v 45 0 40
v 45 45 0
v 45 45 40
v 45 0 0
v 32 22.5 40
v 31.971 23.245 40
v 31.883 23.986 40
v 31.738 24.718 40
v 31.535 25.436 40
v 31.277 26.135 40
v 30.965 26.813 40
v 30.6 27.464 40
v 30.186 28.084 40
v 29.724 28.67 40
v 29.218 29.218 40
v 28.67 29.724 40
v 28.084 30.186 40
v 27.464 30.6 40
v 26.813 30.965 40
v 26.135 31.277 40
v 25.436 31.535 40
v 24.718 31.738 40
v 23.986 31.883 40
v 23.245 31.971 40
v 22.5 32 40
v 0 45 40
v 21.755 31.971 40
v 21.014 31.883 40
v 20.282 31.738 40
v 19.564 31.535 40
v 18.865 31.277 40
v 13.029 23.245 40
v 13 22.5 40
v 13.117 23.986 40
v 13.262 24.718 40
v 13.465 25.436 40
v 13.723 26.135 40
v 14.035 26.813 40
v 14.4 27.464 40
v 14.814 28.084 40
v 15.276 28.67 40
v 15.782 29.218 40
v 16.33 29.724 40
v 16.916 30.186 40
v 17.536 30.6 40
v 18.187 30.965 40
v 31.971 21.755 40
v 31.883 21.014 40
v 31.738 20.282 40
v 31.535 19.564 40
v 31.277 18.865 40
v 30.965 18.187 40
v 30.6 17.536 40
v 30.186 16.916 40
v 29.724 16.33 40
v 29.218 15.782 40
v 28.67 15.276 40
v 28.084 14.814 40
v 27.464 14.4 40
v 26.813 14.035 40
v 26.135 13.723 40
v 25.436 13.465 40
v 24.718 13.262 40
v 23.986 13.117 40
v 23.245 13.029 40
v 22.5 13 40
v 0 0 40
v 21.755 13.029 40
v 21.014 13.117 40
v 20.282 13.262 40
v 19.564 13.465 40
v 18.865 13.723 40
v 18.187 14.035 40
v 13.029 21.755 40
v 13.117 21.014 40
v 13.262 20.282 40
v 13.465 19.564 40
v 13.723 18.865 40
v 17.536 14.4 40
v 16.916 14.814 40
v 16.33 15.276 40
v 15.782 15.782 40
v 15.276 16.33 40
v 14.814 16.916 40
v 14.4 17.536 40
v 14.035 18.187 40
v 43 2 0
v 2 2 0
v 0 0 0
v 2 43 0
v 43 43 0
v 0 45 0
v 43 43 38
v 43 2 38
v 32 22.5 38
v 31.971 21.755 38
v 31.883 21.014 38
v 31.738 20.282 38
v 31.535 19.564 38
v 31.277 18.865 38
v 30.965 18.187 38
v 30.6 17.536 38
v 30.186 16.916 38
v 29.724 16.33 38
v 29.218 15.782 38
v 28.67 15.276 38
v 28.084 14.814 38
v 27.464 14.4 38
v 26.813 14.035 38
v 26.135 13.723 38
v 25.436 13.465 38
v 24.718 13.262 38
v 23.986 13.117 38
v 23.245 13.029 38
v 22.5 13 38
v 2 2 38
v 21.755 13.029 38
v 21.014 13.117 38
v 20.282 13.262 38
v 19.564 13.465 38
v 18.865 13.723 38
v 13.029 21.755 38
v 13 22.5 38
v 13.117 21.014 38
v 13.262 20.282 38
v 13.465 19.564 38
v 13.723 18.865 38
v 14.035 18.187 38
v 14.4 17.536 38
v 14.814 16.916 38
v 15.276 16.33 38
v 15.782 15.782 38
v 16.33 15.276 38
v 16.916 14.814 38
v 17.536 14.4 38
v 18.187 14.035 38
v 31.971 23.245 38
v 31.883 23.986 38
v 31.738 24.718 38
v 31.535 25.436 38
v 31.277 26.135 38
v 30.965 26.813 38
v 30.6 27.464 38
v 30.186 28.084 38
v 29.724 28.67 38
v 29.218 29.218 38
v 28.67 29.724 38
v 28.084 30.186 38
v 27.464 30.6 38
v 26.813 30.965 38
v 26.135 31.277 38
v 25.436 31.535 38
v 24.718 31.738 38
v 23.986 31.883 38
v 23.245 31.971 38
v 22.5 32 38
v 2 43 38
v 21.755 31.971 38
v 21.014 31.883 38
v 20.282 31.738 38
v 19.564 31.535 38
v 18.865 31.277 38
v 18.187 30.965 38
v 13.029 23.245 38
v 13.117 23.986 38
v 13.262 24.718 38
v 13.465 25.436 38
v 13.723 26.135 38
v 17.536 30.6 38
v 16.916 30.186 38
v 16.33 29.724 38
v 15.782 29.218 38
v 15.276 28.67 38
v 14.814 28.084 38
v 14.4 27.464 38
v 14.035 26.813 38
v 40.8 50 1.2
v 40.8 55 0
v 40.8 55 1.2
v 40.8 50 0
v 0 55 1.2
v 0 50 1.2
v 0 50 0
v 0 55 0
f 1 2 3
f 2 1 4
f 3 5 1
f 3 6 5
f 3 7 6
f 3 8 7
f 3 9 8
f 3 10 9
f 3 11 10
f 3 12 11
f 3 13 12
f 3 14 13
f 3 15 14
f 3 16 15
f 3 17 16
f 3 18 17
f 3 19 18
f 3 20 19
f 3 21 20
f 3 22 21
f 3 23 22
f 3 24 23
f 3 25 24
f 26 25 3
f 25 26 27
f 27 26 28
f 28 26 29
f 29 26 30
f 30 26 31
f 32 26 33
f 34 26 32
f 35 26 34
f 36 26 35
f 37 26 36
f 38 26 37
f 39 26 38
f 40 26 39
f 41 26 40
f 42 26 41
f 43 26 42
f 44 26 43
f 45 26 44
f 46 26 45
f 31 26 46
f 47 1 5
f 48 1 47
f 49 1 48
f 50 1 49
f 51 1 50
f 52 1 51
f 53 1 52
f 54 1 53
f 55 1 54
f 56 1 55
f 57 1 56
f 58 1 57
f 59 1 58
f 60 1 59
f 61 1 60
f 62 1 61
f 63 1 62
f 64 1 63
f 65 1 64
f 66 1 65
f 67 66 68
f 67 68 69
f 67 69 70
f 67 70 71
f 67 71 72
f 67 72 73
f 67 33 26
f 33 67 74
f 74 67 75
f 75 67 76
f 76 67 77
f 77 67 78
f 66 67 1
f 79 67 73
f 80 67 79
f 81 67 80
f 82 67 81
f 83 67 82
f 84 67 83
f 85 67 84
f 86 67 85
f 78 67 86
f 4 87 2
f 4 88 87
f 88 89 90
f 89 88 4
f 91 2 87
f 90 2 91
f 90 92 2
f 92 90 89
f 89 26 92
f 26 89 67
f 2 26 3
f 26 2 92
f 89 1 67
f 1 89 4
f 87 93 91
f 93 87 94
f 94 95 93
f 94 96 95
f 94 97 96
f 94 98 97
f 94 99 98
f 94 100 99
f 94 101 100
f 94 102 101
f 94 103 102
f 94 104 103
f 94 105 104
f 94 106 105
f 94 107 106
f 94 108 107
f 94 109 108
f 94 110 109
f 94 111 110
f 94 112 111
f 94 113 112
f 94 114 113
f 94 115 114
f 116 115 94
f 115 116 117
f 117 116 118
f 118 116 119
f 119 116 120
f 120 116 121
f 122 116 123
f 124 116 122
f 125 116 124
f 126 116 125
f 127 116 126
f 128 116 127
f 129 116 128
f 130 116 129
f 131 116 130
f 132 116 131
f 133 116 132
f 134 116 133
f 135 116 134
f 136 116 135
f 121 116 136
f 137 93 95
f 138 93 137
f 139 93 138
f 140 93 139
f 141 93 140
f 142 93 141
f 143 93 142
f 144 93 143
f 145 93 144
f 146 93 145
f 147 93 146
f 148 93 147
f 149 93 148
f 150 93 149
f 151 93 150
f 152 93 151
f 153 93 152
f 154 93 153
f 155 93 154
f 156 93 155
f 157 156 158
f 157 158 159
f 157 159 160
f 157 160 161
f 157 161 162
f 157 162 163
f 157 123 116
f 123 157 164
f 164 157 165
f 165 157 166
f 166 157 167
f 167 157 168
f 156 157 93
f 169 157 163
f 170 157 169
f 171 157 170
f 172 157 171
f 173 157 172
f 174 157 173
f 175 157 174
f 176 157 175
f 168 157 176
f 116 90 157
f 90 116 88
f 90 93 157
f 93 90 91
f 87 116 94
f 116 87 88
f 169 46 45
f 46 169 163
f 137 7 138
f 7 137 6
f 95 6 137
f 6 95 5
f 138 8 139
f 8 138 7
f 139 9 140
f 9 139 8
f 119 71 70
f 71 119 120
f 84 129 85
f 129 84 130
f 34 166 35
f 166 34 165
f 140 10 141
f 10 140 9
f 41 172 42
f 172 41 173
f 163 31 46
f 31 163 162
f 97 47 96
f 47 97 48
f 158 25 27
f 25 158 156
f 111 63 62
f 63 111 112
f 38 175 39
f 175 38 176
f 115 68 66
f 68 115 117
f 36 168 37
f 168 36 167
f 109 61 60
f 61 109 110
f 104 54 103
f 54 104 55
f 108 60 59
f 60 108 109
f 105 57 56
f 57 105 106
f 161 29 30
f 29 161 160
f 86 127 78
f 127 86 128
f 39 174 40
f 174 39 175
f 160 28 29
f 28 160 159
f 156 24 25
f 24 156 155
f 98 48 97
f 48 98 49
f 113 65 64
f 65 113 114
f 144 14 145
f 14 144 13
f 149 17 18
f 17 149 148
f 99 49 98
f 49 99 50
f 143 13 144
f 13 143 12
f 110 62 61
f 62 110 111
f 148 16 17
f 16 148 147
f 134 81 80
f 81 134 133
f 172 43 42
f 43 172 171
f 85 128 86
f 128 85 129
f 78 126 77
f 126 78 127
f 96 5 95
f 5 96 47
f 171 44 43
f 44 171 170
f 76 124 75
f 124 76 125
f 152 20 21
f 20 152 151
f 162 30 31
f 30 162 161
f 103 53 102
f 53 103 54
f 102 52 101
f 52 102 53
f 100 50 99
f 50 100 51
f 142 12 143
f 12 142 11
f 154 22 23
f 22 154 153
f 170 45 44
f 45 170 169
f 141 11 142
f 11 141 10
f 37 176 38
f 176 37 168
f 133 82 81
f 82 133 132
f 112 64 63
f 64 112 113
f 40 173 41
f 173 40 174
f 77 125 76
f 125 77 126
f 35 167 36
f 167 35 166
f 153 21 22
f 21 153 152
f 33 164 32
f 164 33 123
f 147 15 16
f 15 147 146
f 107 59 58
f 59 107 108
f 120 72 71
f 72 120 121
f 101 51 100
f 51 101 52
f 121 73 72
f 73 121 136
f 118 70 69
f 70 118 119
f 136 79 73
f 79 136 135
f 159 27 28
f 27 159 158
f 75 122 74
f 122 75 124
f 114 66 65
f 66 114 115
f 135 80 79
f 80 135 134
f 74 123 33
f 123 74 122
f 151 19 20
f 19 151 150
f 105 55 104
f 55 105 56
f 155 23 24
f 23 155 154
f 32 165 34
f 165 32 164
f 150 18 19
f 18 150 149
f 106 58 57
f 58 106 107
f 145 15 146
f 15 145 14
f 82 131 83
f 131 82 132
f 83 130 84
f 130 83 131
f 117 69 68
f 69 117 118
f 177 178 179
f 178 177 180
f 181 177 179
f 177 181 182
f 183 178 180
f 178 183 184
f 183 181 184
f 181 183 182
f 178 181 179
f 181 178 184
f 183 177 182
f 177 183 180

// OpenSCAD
CASE_SIZE_Y = 45;
CASE_SIZE_X = 45;
CASE_SIZE_Z = 40;

BUTTON_SIZE = 19;


difference() {
    cube([CASE_SIZE_X, CASE_SIZE_X, CASE_SIZE_Z]);
    translate([2, 2, -1]) {
        cube([CASE_SIZE_X - 4, CASE_SIZE_X - 4, CASE_SIZE_Z -1]);
    }
    translate([CASE_SIZE_Y/2, CASE_SIZE_X/2, 0]) {
        cylinder(d=BUTTON_SIZE, h=50, $fn=80);
    }
}

translate([0, 50, 0]) {
    cube([CASE_SIZE_X - 4.2, 5, 1.2]);
}
